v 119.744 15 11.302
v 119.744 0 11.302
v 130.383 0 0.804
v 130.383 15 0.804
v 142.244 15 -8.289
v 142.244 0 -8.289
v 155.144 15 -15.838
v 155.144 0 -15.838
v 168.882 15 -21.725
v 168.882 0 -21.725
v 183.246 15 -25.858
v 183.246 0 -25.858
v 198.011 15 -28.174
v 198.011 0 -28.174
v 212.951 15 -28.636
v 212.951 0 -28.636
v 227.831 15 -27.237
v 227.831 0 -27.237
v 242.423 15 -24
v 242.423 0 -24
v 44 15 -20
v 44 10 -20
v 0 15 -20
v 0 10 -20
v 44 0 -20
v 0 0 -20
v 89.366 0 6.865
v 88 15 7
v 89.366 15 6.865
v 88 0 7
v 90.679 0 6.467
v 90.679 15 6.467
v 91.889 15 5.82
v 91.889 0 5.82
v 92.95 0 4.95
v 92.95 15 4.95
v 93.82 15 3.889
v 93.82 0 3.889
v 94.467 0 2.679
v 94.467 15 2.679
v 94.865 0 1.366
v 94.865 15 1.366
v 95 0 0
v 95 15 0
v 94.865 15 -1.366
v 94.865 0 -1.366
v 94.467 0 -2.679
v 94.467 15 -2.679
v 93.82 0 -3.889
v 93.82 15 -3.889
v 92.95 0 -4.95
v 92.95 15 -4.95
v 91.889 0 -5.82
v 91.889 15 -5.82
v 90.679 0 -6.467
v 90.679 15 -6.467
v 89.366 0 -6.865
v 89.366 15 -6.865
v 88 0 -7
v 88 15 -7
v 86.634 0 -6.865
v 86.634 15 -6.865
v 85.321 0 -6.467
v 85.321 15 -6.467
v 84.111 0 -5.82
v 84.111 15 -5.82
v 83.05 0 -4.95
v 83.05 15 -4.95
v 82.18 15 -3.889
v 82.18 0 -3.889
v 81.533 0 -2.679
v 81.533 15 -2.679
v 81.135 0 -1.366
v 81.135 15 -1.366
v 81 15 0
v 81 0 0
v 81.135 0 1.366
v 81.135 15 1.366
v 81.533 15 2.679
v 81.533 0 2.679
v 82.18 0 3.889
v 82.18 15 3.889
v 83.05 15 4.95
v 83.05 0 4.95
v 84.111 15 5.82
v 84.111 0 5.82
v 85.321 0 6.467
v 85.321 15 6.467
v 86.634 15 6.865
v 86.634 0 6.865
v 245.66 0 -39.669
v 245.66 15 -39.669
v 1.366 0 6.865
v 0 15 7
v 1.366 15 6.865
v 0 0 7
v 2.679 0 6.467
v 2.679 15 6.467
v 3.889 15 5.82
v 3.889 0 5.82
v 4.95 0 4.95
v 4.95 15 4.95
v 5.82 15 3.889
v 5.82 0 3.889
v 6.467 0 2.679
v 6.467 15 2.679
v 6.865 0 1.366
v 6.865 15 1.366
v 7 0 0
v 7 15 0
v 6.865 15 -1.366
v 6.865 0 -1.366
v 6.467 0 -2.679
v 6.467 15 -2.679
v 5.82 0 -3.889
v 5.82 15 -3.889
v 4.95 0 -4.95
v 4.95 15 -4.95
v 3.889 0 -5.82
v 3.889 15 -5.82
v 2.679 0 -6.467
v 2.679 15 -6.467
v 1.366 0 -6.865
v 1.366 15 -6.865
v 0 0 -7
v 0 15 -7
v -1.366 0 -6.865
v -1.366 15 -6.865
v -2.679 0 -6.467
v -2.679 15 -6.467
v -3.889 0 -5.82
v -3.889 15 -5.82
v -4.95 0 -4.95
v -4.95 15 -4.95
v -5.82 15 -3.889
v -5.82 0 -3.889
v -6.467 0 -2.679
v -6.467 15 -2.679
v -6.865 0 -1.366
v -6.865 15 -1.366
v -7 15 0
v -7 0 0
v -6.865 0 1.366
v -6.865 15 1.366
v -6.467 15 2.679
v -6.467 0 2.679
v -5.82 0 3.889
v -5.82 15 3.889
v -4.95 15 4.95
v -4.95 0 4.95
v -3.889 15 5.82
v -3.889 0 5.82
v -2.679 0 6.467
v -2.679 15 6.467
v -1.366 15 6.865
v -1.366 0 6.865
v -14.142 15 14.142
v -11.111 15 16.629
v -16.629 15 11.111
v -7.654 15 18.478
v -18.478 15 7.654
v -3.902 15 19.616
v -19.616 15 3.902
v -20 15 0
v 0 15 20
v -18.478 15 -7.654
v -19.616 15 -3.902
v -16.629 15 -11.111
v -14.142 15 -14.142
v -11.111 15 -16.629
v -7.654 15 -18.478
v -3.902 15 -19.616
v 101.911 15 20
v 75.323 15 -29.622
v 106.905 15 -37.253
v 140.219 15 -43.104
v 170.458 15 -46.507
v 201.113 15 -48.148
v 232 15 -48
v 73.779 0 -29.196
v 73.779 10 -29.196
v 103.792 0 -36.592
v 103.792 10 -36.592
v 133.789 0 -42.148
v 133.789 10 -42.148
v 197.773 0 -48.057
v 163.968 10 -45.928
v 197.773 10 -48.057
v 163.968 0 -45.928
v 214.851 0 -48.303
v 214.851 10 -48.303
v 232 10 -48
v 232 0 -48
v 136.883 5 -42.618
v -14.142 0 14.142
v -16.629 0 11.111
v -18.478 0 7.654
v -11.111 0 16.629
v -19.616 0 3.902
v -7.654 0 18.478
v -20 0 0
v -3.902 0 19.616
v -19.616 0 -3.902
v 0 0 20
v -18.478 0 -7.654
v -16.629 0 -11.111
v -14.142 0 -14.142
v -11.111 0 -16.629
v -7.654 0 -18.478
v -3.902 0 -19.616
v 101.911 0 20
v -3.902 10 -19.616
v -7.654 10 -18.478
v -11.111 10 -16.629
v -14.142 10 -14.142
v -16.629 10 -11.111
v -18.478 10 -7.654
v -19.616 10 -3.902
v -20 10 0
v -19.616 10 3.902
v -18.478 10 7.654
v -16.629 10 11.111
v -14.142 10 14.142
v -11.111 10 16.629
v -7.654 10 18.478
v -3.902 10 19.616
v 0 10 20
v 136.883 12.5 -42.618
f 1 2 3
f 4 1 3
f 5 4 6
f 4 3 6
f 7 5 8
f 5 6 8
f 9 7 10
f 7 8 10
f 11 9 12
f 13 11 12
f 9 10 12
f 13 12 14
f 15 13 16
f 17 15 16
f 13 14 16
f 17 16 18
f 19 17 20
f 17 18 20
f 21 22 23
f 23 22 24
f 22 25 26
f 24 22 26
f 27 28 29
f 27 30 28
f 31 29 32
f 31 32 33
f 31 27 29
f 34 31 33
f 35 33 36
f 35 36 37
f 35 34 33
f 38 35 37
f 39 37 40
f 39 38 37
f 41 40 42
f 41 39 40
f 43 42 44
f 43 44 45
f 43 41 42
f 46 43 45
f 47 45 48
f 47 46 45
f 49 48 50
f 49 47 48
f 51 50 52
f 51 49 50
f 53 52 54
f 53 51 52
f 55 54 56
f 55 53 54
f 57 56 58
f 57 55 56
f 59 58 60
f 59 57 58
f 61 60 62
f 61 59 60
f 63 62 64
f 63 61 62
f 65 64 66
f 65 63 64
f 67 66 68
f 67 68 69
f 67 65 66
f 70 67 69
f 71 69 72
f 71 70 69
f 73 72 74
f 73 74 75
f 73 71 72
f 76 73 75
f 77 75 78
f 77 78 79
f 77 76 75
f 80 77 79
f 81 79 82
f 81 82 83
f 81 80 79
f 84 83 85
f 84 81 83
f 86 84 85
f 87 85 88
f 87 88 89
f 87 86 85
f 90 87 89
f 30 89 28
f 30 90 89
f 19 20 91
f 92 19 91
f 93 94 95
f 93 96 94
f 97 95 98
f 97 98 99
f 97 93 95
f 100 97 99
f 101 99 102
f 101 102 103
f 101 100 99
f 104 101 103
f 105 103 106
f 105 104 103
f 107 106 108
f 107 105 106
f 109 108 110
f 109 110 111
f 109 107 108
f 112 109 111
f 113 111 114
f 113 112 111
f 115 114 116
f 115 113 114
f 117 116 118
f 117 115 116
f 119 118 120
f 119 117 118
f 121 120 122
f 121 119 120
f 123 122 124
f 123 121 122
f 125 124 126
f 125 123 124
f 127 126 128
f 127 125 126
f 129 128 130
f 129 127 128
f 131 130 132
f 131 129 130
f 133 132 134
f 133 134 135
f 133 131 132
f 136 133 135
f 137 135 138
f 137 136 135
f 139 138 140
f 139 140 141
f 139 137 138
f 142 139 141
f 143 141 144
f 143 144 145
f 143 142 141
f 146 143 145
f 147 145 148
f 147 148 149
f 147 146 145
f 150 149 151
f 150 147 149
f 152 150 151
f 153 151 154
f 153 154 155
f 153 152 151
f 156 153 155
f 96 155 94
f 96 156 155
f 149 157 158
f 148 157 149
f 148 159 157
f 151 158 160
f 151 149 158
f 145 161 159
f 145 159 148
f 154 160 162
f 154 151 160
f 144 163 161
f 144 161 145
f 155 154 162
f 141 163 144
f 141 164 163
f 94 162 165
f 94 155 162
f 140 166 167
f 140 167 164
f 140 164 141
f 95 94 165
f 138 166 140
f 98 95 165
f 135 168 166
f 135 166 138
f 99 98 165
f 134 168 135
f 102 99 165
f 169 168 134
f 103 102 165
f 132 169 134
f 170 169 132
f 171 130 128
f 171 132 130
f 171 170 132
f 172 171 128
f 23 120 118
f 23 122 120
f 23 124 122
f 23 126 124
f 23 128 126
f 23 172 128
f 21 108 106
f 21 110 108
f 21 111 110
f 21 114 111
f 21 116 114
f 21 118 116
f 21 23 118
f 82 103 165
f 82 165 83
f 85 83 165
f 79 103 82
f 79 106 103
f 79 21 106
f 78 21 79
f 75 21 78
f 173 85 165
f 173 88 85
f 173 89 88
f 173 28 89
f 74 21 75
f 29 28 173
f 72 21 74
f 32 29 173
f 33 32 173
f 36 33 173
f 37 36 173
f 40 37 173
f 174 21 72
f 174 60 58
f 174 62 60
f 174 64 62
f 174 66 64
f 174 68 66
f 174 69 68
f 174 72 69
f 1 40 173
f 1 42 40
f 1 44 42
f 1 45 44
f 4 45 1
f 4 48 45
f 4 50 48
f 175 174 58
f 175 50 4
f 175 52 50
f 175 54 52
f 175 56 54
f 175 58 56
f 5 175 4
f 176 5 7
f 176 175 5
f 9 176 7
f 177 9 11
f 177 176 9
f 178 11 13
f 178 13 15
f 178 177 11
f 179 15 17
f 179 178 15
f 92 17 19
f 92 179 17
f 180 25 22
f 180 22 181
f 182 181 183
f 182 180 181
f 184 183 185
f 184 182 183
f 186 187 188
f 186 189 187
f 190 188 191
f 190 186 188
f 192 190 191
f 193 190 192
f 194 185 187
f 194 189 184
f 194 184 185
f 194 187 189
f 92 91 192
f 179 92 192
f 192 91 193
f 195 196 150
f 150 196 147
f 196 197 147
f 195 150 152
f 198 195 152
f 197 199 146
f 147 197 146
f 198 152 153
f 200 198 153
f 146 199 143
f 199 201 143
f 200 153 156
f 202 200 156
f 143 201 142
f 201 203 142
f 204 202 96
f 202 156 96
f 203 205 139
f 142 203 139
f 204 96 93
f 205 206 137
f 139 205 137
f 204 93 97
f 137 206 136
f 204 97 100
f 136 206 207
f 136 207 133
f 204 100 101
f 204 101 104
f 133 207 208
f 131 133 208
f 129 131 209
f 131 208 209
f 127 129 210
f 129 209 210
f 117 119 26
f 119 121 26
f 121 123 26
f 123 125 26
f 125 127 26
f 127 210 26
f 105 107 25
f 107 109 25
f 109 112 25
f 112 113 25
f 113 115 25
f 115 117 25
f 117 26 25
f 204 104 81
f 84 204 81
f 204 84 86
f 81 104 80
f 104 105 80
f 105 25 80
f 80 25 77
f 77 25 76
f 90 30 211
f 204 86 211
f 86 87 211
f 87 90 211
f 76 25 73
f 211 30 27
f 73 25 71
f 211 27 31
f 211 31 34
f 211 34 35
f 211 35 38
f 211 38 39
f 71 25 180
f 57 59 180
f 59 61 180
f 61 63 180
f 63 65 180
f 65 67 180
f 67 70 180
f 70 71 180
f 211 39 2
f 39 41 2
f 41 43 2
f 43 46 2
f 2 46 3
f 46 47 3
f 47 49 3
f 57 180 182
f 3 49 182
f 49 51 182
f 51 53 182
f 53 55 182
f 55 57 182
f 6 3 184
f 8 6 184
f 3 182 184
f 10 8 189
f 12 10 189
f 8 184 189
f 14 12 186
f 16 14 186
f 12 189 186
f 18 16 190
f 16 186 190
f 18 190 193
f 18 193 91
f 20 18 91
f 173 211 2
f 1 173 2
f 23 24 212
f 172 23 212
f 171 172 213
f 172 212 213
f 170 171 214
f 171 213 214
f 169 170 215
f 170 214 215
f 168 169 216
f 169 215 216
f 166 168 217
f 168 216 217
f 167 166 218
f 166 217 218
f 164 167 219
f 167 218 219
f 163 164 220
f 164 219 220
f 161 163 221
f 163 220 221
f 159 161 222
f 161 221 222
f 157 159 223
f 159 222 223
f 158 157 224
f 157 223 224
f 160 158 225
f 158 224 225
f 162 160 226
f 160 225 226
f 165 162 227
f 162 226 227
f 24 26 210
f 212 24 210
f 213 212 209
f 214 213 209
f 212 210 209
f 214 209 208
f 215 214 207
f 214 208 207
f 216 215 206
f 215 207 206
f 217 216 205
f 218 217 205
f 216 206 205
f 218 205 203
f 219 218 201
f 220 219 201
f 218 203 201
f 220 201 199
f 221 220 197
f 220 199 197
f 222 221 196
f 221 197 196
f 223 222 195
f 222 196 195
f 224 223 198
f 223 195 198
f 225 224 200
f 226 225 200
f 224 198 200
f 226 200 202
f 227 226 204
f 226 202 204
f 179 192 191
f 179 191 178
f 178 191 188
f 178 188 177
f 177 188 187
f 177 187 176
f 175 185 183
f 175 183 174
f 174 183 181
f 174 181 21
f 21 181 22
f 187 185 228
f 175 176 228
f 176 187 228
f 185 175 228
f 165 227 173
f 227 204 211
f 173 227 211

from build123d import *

# Parameters (mm, degrees)
SKETCH_1_R          = 20
SKETCH_1_R_2        = 7
EXTRUDE_1_DEPTH     = 10
EXTRUDE_START       = -10
EXTRUDE_2_DEPTH     = 10
SKETCH_3_R          = 7
EXTRUDE_3_DEPTH     = 10
CUT_EXTRUDE_START   = -5
SKETCH_4_R          = 7
CUT_EXTRUDE_1_DEPTH = 5


with BuildPart() as part:
    # 草图1 → 凸台-拉伸1 (new body)
    # profile 1 of 3: a face of its own
    with BuildSketch(Plane(origin=(0, 0, 0), x_dir=(1, 0, 0), z_dir=(0, 1, 0))):
        Circle(SKETCH_1_R)
        with Locations(Location((0, 0, 0), (0, 0, 270))):
            Circle(SKETCH_1_R_2, mode=Mode.SUBTRACT)
    # profile 2 of 3: a face of its own
    with BuildSketch(Plane(origin=(0, 0, 0), x_dir=(1, 0, 0), z_dir=(0, 1, 0))):
        with BuildLine():
            Line((0, -20), (88, -20))
            ThreePointArc((88, -20), (68, 0), (88, 20))
            Line((88, 20), (-1.4e-08, 20))
            ThreePointArc((-1.4e-08, 20), (14.142135619, 14.142135629), (20, 0))
            ThreePointArc((20, 0), (14.142135624, -14.142135624), (0, -20))
        make_face()
    # profile 3 of 3: a face of its own
    with BuildSketch(Plane(origin=(0, 0, 0), x_dir=(1, 0, 0), z_dir=(0, 1, 0))):
        with Locations((88, 0)):
            Circle(SKETCH_1_R)
        with Locations(Location((88, 0, 0), (0, 0, 270))):
            Circle(SKETCH_1_R_2, mode=Mode.SUBTRACT)
    extrude(amount=EXTRUDE_1_DEPTH)

    # 草图2 → 凸台-拉伸2 (add)
    with BuildSketch(Plane(origin=(0, 10, 0), x_dir=(1, 0, 0), z_dir=(0, 1, 0)).offset(EXTRUDE_START)):
        with BuildLine():
            Line((88, -20), (101.910822615, -20))
            Line((101.910822615, -20), (119.744098688, -11.302130098))
            ThreePointArc((119.744098688, -11.302130098), (175.999613382, 24.015412746), (242.422587784, 24))
            Line((242.422587784, 24), (245.659989933, 39.669053173))
            Line((245.659989933, 39.669053173), (232, 48))
            add(Edge.make_bspline(
                [(44, 20), (135.765778064, 51.236254285), (232, 48)],
                knots=[0, 0, 0, 1, 1, 1], degree=2))
            Line((44, 20), (88, 20))
            ThreePointArc((88, 20), (108, 0), (88, -20))
        make_face()
    extrude(amount=EXTRUDE_2_DEPTH)

    # 草图3 → 凸台-拉伸3 (add)
    with BuildSketch(Plane(origin=(0, 10, 0), x_dir=(1, 0, 0), z_dir=(0, 1, 0))):
        with BuildLine():
            Line((245.659989933, 39.669053173), (232, 48))
            add(Edge.make_bspline(
                [(232, 48), (135.765778064, 51.236254285), (44, 20)],
                knots=[0, 0, 0, 1, 1, 1], degree=2))
            Line((44, 20), (0, 20))
            ThreePointArc((0, 20), (-20, 0), (0, -20))
            Line((0, -20), (101.910822615, -20))
            Line((101.910822615, -20), (119.744098688, -11.302130098))
            ThreePointArc((119.744098688, -11.302130098), (175.999613382, 24.015412746), (242.422587784, 24))
            Line((242.422587784, 24), (245.659989933, 39.669053173))
        make_face()
        with Locations(Location((88, 0, 0), (0, 0, 270))):
            Circle(SKETCH_3_R, mode=Mode.SUBTRACT)
        with Locations(Location((0, 0, 0), (0, 0, 270))):
            Circle(SKETCH_3_R, mode=Mode.SUBTRACT)
    extrude(amount=EXTRUDE_3_DEPTH)

    # 草图4 → 切除-拉伸1 (cut)
    with BuildSketch(Plane(origin=(0, 20, 0), x_dir=(1, 0, 0), z_dir=(0, 1, 0)).offset(CUT_EXTRUDE_START)):
        with BuildLine():
            Line((242.422587784, 24), (245.659989933, 39.669053173))
            Line((245.659989933, 39.669053173), (232, 48))
            add(Edge.make_bspline(
                [(232, 48), (135.765778061, 51.236254285), (43.999999994, 19.999999998)],
                knots=[0, 0, 0, 1, 1, 1], degree=2))
            Line((43.999999994, 19.999999998), (0, 20))
            ThreePointArc((0, 20), (-20, 0), (0, -20))
            Line((0, -20), (101.910822615, -20))
            Line((101.910822615, -20), (119.744098688, -11.302130098))
            ThreePointArc((119.744098688, -11.302130098), (175.999613382, 24.015412746), (242.422587784, 24))
        make_face()
        with Locations(Location((0, 0, 0), (0, 0, 270))):
            Circle(SKETCH_4_R, mode=Mode.SUBTRACT)
        with Locations(Location((88, 0, 0), (0, 0, 270))):
            Circle(SKETCH_4_R, mode=Mode.SUBTRACT)
    extrude(amount=CUT_EXTRUDE_1_DEPTH, mode=Mode.SUBTRACT)


solid = part.part
